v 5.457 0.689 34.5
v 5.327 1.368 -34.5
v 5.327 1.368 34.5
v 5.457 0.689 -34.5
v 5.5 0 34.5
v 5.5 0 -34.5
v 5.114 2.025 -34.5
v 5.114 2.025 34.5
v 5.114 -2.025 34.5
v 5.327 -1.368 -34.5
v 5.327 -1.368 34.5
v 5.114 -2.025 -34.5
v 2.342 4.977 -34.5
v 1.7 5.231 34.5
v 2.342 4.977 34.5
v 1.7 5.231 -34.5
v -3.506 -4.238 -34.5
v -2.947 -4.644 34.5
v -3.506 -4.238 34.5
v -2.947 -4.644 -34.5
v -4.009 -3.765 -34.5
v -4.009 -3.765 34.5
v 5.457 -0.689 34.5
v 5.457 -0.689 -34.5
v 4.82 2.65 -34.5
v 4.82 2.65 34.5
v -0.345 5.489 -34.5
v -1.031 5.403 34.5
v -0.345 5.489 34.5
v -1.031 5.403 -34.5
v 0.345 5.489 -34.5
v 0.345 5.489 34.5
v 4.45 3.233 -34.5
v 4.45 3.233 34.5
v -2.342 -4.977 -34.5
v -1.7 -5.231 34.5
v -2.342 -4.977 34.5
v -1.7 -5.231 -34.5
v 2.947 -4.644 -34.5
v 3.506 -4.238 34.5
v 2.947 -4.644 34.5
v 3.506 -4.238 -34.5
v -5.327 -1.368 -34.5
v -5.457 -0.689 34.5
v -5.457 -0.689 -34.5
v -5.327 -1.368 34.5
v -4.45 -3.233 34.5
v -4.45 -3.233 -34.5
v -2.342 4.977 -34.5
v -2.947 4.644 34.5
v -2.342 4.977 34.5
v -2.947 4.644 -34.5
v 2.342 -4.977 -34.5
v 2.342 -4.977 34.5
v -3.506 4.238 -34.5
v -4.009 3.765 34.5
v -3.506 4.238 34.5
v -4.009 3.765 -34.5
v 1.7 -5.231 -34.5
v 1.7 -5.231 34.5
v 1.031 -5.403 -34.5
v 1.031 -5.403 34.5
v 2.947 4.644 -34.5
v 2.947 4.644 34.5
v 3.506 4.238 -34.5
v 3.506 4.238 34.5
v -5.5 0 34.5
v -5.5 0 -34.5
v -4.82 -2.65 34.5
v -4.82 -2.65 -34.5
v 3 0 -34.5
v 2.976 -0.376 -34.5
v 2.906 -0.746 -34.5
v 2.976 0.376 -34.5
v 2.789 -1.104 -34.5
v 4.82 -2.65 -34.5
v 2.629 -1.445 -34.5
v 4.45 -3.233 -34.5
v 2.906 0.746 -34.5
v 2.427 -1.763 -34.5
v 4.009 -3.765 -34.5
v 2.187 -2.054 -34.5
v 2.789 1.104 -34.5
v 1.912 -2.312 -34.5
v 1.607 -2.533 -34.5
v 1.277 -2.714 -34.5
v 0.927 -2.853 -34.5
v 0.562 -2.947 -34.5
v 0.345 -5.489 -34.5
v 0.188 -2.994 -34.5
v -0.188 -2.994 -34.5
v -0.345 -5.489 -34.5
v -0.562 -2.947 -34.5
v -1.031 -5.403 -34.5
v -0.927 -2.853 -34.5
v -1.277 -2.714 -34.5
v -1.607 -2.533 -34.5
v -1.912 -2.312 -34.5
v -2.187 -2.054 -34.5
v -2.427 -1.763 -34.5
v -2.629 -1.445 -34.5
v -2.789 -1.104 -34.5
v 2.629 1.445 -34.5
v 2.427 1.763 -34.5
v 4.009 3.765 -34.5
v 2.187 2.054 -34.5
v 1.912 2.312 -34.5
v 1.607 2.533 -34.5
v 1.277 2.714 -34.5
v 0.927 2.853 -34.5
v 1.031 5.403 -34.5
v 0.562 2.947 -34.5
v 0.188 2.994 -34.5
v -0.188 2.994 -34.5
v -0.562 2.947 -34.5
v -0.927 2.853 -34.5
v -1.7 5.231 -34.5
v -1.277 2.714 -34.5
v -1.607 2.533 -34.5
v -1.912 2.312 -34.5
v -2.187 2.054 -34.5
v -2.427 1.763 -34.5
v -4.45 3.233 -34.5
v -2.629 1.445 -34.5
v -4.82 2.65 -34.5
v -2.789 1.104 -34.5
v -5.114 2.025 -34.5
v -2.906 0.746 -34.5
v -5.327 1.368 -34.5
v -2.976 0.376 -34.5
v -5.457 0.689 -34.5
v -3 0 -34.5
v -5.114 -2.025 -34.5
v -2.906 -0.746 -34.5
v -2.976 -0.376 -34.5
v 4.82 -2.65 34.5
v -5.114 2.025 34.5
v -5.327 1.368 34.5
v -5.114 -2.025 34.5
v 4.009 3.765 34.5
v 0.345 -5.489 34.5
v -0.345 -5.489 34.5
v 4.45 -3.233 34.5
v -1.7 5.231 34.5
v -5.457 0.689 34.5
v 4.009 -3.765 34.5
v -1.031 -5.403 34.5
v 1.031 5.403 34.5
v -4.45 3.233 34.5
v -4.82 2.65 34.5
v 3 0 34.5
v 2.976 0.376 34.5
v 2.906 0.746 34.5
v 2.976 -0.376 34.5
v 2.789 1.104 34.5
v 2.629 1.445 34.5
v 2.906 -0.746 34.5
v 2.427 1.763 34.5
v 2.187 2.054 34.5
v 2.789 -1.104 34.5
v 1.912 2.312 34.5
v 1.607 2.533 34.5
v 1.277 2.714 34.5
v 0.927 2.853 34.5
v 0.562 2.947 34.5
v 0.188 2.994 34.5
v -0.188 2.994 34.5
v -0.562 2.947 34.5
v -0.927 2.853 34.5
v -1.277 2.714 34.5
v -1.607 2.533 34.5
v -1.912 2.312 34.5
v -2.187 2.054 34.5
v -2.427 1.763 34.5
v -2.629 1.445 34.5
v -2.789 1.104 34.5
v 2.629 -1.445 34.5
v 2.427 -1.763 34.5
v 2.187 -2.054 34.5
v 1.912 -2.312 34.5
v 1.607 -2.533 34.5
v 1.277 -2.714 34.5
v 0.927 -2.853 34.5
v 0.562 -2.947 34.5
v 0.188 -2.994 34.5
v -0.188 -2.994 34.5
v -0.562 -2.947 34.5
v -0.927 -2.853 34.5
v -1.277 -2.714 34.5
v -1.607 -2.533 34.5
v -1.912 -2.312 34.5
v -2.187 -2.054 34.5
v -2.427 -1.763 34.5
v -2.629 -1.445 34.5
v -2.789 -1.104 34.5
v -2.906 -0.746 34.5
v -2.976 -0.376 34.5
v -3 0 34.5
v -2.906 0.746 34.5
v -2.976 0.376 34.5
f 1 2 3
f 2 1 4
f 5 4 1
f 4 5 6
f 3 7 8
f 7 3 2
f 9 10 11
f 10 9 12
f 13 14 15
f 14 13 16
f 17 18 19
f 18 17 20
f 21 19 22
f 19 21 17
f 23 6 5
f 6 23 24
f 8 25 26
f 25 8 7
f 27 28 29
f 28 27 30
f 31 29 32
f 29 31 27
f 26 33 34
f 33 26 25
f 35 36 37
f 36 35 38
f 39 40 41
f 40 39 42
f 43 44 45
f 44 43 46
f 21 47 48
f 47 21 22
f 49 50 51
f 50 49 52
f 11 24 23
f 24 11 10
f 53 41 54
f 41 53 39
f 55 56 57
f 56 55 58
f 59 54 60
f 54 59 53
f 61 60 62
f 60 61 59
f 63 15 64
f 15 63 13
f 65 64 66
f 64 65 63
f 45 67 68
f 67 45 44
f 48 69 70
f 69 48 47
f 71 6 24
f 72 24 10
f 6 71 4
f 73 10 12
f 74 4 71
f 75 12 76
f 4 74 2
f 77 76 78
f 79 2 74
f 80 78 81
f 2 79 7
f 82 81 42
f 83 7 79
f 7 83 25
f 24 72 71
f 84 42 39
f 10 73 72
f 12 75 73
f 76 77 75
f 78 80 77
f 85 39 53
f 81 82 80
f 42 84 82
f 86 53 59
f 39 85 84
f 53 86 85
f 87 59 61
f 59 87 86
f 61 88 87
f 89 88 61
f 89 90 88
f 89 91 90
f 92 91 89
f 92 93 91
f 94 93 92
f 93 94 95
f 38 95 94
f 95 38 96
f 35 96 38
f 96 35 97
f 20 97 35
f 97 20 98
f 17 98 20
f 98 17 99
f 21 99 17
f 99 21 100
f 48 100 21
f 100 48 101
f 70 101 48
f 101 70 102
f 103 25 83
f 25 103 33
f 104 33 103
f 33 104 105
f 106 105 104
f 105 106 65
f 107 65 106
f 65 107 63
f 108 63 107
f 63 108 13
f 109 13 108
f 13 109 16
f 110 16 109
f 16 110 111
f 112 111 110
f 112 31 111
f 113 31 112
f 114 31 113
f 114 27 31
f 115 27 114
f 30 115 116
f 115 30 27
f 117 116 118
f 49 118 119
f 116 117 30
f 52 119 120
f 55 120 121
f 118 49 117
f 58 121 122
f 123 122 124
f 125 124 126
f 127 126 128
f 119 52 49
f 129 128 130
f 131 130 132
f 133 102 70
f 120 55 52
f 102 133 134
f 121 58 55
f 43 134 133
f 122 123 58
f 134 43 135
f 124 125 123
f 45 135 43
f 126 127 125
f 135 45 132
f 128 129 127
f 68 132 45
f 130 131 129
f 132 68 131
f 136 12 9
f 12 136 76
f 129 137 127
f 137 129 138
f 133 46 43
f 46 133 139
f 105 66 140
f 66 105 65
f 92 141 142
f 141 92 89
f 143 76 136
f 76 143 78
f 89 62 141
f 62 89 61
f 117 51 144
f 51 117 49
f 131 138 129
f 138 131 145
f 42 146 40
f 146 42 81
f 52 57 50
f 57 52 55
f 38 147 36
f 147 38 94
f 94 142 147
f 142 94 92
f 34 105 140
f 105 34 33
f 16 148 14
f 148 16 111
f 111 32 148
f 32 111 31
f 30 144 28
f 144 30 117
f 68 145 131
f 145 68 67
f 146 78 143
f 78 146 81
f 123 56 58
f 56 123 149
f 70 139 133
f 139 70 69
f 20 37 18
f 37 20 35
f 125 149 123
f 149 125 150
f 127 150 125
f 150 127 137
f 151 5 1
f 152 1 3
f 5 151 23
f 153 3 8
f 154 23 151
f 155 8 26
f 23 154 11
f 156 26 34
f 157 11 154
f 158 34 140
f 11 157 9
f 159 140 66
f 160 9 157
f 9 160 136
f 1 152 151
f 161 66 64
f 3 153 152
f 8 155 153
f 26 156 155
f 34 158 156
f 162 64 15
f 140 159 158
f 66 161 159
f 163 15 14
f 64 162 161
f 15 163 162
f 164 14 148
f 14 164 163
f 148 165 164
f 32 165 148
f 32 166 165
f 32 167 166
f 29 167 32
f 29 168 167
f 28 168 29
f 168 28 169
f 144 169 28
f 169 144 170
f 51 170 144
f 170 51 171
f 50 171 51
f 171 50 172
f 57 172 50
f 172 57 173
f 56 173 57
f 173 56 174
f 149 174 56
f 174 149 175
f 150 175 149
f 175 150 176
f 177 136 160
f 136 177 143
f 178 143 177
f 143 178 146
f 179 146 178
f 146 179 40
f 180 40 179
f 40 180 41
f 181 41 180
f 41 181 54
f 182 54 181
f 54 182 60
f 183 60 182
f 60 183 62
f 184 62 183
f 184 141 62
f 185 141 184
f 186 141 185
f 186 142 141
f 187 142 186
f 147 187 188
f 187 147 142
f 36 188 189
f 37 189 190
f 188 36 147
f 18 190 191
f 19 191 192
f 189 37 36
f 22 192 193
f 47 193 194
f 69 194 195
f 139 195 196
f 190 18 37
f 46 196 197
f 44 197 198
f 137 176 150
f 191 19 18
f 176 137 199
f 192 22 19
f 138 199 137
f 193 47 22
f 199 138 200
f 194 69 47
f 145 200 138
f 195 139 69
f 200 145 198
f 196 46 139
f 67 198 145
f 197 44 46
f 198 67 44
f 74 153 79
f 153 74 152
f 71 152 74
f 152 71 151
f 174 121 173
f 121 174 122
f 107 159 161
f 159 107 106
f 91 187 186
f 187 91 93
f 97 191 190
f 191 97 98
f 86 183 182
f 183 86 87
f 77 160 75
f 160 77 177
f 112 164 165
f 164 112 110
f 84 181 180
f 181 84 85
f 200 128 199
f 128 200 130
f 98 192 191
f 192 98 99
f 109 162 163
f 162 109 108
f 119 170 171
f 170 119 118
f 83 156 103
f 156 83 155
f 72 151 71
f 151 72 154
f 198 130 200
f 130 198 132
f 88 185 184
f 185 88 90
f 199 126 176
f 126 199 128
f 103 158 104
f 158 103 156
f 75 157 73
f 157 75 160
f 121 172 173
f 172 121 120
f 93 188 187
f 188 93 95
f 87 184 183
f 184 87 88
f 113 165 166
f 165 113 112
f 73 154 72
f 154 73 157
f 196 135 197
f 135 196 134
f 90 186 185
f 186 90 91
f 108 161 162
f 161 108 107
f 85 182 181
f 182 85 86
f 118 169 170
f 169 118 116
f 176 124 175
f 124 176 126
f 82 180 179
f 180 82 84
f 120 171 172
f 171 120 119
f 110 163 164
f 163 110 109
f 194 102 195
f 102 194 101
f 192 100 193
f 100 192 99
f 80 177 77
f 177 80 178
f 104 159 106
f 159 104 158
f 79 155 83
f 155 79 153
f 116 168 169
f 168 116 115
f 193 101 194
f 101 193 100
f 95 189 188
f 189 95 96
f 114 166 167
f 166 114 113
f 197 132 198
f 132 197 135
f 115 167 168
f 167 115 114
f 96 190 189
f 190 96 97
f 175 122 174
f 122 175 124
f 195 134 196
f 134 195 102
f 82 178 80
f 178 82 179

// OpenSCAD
$fn = 50;


difference() {
	union() {
		translate(v = [0, 0, -34.5000000000]) {
			cylinder(h = 69, r = 5.5000000000);
		}
	}
	union() {
		translate(v = [0, 0, -100.0000000000]) {
			cylinder(h = 200, r = 3.0000000000);
		}
	}
}
